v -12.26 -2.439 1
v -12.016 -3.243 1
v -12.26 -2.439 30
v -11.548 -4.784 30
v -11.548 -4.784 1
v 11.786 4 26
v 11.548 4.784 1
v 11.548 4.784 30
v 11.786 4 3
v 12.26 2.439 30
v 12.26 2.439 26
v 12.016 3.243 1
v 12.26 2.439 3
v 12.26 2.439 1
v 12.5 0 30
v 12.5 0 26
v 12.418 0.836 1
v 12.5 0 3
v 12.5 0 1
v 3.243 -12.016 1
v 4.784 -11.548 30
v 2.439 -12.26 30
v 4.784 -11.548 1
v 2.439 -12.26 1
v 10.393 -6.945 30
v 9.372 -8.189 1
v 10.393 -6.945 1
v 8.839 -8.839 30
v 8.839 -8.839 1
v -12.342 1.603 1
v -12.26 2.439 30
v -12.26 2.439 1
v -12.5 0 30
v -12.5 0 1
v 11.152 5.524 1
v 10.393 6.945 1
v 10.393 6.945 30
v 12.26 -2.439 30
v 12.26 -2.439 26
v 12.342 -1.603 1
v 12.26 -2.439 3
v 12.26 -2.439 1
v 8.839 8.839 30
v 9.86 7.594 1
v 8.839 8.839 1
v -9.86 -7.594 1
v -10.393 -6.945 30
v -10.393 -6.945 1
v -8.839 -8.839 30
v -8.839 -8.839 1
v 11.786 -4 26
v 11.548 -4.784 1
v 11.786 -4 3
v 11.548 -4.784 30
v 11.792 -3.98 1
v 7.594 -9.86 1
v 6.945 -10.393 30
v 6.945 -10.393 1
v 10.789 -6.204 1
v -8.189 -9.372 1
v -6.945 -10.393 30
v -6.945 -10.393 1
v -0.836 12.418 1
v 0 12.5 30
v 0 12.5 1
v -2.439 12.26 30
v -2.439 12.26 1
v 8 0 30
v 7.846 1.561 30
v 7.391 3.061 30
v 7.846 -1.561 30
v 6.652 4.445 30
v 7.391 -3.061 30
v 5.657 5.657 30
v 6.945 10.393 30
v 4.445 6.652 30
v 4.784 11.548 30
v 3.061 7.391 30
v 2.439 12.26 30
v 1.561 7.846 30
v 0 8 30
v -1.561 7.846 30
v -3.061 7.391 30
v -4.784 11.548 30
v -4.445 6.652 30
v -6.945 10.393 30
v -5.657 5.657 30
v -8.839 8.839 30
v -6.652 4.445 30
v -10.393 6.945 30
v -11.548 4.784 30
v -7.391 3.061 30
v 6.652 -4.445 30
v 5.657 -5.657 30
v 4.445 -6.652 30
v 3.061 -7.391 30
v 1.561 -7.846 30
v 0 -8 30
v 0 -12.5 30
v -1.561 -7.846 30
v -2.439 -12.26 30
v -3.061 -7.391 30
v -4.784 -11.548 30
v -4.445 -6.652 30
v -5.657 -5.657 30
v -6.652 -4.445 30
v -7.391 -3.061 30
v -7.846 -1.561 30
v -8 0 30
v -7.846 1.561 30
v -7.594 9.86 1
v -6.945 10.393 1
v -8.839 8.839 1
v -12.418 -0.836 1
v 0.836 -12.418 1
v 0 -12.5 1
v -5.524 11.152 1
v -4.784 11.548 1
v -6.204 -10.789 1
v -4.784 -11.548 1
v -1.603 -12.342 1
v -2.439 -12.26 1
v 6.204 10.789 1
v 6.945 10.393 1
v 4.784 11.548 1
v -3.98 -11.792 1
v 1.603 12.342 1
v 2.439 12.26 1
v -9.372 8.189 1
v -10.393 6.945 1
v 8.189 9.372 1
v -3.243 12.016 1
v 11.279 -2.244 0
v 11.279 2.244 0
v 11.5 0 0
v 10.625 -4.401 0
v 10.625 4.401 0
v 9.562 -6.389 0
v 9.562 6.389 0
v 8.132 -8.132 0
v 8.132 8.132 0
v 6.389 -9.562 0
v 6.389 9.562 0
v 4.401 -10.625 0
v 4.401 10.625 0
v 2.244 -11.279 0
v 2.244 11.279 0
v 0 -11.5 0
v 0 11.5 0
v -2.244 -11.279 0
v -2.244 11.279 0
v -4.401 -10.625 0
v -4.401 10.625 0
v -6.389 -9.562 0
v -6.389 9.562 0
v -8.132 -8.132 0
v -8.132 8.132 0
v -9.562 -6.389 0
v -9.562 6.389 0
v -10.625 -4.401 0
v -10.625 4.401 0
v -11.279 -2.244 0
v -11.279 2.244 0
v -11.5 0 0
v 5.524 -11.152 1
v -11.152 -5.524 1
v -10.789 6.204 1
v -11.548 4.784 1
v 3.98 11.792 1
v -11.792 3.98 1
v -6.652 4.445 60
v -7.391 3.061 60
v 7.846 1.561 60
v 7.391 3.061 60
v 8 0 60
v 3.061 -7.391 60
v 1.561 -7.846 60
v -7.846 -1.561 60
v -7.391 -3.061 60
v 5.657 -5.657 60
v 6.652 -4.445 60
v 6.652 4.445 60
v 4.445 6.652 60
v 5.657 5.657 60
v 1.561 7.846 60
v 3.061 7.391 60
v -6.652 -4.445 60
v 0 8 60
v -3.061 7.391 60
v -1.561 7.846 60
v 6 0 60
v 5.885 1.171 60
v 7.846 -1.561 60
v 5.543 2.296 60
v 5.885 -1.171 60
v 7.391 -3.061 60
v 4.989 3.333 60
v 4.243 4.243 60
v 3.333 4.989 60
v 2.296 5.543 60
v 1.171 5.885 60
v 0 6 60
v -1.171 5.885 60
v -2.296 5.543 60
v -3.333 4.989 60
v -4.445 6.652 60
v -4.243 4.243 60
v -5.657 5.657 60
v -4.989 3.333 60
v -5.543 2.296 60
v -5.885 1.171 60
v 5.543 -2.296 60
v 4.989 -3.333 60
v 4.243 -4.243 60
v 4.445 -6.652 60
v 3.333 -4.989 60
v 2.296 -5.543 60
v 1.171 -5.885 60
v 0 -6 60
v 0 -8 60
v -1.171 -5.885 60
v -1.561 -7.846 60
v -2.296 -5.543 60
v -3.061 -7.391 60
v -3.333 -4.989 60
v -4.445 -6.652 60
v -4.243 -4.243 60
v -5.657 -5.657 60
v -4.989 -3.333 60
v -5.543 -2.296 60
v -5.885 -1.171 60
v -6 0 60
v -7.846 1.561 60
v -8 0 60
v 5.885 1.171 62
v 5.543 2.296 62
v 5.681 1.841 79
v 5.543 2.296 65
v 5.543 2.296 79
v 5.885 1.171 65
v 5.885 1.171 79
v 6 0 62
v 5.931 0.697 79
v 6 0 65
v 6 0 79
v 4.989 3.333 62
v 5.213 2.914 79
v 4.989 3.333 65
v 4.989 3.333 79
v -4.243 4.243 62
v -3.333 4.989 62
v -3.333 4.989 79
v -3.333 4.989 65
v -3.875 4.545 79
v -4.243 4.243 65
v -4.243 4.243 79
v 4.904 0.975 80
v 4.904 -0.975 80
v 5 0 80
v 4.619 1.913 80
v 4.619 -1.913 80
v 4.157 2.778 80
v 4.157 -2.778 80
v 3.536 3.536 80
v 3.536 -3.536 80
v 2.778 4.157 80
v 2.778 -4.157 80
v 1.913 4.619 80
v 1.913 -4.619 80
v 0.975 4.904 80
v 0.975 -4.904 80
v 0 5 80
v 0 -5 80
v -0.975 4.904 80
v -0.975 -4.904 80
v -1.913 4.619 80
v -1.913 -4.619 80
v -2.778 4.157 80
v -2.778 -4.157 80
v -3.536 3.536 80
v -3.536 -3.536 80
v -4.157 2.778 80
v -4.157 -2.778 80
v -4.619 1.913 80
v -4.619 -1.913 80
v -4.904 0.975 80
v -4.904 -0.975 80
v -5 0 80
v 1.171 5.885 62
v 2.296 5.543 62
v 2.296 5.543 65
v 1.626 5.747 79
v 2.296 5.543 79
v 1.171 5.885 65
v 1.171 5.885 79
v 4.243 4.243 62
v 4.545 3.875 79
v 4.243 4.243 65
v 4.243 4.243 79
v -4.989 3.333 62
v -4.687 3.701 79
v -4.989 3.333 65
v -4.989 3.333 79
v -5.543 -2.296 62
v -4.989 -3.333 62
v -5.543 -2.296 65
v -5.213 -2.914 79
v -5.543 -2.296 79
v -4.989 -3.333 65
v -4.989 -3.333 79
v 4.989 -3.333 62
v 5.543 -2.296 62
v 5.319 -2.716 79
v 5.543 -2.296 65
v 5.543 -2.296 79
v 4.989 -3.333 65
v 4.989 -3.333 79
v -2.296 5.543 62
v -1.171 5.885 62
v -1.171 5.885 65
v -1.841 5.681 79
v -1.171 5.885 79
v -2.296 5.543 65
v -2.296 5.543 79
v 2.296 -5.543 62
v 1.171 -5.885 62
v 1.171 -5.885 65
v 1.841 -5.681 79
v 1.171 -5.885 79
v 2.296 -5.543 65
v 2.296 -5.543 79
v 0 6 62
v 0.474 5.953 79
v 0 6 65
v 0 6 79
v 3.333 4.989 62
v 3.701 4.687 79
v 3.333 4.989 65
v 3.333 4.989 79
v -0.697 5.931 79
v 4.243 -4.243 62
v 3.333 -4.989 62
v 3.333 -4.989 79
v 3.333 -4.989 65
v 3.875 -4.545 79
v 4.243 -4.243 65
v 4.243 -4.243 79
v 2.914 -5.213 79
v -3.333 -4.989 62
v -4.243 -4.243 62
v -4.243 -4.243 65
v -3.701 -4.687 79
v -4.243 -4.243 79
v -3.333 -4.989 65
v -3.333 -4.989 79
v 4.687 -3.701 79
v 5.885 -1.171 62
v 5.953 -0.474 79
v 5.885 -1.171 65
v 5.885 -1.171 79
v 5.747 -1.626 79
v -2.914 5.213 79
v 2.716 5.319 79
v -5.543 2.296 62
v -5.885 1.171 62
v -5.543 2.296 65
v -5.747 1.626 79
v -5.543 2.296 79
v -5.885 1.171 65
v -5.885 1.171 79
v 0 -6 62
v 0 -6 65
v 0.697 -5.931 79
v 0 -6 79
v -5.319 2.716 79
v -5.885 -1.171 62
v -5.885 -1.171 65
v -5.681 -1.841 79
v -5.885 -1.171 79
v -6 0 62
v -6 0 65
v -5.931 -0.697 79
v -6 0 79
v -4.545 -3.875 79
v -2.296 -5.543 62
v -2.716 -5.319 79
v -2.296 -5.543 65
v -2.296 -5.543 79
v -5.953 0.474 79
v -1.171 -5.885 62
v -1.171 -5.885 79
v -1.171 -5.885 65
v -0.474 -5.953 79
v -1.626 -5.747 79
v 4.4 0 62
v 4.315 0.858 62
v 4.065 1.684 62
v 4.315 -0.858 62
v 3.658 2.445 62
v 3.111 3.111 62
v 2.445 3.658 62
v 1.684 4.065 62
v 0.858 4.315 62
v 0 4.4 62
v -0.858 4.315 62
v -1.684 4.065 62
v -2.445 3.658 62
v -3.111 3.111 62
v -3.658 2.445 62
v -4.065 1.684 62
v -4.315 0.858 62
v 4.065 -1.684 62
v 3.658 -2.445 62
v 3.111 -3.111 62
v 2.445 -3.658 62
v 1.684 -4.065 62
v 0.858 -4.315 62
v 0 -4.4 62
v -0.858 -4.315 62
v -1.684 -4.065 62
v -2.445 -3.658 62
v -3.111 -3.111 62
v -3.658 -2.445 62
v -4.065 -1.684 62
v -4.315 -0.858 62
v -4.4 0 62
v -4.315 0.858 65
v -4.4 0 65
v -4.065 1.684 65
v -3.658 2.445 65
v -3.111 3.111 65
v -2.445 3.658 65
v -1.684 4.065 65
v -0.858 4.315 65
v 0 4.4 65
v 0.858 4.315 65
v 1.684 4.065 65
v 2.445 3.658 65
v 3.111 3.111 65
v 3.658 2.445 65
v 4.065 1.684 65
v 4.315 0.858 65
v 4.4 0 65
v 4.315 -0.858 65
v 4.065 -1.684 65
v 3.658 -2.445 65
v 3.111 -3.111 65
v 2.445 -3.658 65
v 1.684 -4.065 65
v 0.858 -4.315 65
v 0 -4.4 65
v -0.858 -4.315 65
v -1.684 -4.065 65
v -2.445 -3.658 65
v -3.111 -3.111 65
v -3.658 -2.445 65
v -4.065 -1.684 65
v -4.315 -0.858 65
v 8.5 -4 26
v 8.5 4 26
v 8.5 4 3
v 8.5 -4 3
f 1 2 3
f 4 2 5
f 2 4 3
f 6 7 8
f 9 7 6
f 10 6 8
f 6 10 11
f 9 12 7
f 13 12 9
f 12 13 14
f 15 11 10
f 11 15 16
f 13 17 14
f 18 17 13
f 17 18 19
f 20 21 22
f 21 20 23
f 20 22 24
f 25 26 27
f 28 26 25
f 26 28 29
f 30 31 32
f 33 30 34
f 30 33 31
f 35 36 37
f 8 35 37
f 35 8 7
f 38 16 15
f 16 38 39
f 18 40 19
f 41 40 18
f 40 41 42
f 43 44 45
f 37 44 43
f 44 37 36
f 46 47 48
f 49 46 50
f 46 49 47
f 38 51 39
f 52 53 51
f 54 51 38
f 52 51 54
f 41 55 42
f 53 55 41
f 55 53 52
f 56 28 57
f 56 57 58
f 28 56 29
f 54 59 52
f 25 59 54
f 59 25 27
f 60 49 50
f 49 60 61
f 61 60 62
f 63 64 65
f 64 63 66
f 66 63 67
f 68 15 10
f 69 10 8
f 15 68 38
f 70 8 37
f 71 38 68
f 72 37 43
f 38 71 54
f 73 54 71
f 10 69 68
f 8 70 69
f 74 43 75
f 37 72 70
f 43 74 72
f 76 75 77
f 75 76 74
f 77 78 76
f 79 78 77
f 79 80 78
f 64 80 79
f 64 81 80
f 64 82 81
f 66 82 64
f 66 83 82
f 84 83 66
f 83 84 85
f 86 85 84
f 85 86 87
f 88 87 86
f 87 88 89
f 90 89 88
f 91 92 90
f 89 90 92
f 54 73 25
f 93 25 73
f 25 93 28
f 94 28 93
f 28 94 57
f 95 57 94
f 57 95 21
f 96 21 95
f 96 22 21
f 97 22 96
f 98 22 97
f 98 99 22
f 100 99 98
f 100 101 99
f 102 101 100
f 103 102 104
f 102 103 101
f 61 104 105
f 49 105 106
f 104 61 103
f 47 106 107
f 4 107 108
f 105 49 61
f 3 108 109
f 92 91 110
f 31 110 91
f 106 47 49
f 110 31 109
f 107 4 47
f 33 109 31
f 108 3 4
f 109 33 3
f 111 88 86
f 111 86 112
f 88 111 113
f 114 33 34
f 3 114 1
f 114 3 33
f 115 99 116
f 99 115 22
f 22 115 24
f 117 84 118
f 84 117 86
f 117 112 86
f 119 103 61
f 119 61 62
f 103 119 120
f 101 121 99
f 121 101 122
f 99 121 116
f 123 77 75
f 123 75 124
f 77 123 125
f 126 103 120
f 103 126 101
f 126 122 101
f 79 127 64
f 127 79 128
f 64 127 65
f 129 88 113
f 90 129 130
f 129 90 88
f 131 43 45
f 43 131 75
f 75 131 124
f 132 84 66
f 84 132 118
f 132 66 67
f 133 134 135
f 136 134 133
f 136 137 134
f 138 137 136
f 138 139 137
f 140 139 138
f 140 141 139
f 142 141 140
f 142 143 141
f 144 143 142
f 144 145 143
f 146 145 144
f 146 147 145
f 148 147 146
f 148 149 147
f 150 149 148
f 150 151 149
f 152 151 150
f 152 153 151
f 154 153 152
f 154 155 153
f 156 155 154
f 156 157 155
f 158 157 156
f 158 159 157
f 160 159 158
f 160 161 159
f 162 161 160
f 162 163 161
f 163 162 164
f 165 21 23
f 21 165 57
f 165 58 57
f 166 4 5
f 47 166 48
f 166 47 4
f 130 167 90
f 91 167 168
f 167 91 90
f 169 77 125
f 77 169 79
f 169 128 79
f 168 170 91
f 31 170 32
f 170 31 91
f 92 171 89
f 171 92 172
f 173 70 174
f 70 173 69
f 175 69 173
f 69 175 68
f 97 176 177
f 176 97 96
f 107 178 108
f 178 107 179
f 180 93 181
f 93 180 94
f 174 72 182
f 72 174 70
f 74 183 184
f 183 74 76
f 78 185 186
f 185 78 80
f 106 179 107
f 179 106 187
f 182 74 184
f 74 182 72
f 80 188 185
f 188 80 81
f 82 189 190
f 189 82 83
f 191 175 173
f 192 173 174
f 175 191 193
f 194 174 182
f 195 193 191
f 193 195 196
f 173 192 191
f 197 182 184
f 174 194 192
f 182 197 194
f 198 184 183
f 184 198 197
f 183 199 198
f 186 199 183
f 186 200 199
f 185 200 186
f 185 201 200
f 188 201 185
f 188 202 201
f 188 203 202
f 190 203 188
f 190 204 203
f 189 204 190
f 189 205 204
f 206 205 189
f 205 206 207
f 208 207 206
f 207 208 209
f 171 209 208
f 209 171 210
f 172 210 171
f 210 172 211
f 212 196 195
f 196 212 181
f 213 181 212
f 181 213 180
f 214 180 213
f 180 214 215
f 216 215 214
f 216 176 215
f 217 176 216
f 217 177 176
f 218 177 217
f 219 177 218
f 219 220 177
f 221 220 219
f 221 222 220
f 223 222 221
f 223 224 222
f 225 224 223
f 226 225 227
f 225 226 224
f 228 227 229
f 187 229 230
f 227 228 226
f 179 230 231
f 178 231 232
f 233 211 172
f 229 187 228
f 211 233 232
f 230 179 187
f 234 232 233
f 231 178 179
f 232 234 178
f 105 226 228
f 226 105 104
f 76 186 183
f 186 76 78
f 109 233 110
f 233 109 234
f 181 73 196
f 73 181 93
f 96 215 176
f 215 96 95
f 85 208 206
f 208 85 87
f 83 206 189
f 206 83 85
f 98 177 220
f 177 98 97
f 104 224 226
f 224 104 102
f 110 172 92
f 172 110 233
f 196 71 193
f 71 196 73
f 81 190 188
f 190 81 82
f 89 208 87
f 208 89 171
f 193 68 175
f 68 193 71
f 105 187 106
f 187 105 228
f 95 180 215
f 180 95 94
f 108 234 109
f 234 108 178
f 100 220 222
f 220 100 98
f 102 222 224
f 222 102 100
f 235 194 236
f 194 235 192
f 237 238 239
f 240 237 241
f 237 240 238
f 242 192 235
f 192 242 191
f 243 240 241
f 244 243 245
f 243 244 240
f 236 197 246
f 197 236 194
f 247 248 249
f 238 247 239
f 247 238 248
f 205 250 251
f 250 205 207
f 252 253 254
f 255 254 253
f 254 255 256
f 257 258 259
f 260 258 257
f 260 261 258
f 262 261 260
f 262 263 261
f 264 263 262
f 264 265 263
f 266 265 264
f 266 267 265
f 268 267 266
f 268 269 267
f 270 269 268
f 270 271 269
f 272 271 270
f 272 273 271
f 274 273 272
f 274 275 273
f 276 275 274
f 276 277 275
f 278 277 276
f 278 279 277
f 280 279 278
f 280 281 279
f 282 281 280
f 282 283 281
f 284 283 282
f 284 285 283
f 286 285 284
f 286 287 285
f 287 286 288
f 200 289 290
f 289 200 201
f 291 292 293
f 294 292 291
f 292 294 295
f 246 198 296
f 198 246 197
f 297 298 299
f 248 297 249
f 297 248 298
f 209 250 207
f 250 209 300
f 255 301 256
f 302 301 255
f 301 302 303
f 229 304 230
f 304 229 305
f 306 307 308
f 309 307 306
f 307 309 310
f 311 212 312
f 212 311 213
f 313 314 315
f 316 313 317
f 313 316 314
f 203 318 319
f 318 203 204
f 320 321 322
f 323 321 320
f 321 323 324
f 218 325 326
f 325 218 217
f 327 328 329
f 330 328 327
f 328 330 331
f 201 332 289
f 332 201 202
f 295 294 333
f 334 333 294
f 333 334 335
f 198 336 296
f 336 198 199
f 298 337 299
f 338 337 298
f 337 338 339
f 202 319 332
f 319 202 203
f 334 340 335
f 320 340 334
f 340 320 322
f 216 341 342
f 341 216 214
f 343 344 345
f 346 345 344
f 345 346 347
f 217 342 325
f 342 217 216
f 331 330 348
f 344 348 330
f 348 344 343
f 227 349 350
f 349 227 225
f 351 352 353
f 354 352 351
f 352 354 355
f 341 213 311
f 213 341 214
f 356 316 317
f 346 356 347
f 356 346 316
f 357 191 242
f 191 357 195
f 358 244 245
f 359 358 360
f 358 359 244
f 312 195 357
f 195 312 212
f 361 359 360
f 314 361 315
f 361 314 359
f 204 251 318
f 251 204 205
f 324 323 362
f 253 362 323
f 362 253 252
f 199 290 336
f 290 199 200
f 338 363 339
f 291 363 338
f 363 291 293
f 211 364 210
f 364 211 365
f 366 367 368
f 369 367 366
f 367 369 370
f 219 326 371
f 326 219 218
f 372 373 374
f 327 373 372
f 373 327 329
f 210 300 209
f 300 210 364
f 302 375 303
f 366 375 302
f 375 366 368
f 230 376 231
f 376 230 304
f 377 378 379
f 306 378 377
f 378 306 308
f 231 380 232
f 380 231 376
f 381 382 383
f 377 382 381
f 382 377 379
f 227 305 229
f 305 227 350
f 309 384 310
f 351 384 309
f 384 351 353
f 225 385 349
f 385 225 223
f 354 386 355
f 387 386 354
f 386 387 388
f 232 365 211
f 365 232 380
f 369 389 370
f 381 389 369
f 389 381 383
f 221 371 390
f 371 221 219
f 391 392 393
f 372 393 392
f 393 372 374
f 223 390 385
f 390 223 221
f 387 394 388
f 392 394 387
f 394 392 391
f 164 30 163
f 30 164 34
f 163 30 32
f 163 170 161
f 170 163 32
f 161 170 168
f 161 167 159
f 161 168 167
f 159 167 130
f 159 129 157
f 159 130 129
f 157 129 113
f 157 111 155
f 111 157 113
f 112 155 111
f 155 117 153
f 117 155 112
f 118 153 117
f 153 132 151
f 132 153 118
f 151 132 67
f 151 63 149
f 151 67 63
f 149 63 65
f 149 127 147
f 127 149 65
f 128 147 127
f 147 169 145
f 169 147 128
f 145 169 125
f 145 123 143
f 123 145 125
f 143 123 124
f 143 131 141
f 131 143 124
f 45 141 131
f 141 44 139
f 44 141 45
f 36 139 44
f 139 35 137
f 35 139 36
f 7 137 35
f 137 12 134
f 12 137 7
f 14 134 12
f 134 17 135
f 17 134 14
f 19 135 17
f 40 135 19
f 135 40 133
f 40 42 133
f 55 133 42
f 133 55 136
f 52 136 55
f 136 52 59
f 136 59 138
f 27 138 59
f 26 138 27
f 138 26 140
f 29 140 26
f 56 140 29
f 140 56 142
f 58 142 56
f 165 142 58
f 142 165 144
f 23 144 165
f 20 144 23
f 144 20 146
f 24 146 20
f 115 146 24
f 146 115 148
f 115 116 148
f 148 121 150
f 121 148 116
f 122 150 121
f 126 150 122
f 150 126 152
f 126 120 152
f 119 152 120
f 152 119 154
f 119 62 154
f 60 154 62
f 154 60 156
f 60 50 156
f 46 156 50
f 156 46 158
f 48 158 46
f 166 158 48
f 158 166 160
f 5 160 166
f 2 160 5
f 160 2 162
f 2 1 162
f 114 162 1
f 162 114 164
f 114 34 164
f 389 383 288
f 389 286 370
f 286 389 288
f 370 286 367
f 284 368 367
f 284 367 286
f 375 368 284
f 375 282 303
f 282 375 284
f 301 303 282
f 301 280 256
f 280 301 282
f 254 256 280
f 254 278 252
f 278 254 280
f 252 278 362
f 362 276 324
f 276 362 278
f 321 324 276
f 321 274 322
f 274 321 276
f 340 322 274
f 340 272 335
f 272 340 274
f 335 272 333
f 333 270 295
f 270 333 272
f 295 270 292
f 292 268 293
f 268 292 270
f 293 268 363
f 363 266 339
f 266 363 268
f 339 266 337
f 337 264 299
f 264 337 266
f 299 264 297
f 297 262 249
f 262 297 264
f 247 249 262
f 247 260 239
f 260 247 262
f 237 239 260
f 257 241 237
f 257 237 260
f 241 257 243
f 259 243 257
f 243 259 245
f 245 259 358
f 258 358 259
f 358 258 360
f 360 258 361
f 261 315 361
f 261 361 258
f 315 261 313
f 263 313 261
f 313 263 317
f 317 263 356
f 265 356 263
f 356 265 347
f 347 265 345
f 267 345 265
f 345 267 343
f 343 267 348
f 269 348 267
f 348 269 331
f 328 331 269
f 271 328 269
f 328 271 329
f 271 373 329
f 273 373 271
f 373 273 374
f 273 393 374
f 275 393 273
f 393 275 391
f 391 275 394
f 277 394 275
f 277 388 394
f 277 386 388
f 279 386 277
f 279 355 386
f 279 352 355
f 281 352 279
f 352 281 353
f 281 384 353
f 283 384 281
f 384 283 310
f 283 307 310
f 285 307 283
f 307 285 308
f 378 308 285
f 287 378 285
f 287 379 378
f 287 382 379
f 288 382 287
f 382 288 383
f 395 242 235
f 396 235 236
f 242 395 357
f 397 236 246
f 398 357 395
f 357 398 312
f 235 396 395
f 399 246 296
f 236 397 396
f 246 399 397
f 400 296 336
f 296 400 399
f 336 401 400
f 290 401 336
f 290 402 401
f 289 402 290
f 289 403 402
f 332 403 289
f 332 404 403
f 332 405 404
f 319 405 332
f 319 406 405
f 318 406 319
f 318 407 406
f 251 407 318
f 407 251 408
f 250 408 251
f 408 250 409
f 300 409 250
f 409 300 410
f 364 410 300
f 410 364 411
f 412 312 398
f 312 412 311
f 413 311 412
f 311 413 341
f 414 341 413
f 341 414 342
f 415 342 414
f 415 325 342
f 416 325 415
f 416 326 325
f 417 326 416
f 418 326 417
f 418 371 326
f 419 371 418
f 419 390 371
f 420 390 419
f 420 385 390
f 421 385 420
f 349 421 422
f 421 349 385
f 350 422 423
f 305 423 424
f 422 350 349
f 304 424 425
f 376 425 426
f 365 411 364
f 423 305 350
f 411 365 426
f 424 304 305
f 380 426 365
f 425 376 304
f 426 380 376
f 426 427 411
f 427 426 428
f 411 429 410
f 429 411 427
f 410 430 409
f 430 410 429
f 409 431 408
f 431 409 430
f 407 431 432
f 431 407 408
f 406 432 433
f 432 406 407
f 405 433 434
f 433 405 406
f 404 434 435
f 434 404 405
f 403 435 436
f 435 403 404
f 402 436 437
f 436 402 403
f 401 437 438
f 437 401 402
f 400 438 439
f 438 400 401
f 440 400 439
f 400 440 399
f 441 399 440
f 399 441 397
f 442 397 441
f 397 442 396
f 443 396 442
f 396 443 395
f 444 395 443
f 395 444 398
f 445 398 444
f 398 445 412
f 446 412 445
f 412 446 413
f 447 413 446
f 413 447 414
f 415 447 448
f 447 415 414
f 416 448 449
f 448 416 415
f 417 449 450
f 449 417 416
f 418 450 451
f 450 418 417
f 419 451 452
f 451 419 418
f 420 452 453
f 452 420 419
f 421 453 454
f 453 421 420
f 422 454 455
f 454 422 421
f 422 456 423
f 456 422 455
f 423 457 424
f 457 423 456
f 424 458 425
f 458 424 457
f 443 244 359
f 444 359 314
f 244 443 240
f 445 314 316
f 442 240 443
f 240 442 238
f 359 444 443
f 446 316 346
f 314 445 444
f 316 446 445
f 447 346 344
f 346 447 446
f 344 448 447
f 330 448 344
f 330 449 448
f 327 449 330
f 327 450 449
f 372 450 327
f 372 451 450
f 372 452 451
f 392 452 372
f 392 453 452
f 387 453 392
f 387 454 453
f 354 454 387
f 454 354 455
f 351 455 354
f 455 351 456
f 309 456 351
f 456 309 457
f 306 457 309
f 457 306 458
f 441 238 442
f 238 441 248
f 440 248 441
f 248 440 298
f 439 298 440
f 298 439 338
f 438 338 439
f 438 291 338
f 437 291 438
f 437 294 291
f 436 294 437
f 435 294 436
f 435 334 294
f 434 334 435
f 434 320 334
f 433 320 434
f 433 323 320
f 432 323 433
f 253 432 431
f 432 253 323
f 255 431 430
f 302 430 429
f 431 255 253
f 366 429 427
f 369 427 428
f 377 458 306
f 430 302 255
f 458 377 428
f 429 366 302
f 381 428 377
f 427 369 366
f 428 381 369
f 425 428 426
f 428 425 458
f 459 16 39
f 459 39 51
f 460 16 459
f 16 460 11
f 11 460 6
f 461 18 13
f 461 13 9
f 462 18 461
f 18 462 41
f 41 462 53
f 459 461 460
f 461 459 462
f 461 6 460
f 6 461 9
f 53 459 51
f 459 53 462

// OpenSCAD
$fn = 32;

// ----------------------------------------------------------------------
// Stepped shaft: diameters 25, 16, 12 mm, 80 mm long
// ----------------------------------------------------------------------

// --- parameters (mm) ---
d1 = 25;                  // step 1 diameter
len1 = 30;                // step 1 length
d2 = 16;                  // step 2 diameter
len2 = 30;                // step 2 length
d3 = 12;                  // step 3 diameter
len3 = 20;                // step 3 length
total = 80;               // overall length
chamfer = 1;              // end chamfer
groove_r = 6;             // groove radius
groove_z = 62;            // groove position from the end
groove_w = 3;             // groove width
groove_d = 1.6;           // groove depth
key_w = 8;                // keyway width
key_d = 4;                // keyway depth
key_len = 23;             // keyway length
key_z = 3;                // keyway start along the shaft

difference() {
  /* turned body: stacked cylinders, every step sunk into the bigger one */
  union() {
    cylinder(h = len1, d = d1);
    translate([0, 0, 29.6]) cylinder(h = 30.4, d = d2);
    translate([0, 0, 59.6]) cylinder(h = 20.4, d = d3);
  }
  /* bottom chamfer ring cut */
  rotate_extrude() translate([11.5, -2.5]) polygon([[0, 0], [3.5, 0], [3.5, 6], [0, 2.5]]);
  /* top chamfer ring cut */
  rotate_extrude() translate([5, 80]) polygon([[0, 0], [3.5, -3.5], [3.5, 2.5], [0, 2.5]]);
  /* circlip groove just behind the shoulder */
  rotate_extrude() translate([groove_r - groove_d, groove_z]) square([groove_d + 2.5, groove_w]);
  /* keyway milled along the first step */
  translate([d1 / 2 - key_d, -key_w / 2, key_z]) cube([key_d + 2.5, key_w, key_len]);
}
